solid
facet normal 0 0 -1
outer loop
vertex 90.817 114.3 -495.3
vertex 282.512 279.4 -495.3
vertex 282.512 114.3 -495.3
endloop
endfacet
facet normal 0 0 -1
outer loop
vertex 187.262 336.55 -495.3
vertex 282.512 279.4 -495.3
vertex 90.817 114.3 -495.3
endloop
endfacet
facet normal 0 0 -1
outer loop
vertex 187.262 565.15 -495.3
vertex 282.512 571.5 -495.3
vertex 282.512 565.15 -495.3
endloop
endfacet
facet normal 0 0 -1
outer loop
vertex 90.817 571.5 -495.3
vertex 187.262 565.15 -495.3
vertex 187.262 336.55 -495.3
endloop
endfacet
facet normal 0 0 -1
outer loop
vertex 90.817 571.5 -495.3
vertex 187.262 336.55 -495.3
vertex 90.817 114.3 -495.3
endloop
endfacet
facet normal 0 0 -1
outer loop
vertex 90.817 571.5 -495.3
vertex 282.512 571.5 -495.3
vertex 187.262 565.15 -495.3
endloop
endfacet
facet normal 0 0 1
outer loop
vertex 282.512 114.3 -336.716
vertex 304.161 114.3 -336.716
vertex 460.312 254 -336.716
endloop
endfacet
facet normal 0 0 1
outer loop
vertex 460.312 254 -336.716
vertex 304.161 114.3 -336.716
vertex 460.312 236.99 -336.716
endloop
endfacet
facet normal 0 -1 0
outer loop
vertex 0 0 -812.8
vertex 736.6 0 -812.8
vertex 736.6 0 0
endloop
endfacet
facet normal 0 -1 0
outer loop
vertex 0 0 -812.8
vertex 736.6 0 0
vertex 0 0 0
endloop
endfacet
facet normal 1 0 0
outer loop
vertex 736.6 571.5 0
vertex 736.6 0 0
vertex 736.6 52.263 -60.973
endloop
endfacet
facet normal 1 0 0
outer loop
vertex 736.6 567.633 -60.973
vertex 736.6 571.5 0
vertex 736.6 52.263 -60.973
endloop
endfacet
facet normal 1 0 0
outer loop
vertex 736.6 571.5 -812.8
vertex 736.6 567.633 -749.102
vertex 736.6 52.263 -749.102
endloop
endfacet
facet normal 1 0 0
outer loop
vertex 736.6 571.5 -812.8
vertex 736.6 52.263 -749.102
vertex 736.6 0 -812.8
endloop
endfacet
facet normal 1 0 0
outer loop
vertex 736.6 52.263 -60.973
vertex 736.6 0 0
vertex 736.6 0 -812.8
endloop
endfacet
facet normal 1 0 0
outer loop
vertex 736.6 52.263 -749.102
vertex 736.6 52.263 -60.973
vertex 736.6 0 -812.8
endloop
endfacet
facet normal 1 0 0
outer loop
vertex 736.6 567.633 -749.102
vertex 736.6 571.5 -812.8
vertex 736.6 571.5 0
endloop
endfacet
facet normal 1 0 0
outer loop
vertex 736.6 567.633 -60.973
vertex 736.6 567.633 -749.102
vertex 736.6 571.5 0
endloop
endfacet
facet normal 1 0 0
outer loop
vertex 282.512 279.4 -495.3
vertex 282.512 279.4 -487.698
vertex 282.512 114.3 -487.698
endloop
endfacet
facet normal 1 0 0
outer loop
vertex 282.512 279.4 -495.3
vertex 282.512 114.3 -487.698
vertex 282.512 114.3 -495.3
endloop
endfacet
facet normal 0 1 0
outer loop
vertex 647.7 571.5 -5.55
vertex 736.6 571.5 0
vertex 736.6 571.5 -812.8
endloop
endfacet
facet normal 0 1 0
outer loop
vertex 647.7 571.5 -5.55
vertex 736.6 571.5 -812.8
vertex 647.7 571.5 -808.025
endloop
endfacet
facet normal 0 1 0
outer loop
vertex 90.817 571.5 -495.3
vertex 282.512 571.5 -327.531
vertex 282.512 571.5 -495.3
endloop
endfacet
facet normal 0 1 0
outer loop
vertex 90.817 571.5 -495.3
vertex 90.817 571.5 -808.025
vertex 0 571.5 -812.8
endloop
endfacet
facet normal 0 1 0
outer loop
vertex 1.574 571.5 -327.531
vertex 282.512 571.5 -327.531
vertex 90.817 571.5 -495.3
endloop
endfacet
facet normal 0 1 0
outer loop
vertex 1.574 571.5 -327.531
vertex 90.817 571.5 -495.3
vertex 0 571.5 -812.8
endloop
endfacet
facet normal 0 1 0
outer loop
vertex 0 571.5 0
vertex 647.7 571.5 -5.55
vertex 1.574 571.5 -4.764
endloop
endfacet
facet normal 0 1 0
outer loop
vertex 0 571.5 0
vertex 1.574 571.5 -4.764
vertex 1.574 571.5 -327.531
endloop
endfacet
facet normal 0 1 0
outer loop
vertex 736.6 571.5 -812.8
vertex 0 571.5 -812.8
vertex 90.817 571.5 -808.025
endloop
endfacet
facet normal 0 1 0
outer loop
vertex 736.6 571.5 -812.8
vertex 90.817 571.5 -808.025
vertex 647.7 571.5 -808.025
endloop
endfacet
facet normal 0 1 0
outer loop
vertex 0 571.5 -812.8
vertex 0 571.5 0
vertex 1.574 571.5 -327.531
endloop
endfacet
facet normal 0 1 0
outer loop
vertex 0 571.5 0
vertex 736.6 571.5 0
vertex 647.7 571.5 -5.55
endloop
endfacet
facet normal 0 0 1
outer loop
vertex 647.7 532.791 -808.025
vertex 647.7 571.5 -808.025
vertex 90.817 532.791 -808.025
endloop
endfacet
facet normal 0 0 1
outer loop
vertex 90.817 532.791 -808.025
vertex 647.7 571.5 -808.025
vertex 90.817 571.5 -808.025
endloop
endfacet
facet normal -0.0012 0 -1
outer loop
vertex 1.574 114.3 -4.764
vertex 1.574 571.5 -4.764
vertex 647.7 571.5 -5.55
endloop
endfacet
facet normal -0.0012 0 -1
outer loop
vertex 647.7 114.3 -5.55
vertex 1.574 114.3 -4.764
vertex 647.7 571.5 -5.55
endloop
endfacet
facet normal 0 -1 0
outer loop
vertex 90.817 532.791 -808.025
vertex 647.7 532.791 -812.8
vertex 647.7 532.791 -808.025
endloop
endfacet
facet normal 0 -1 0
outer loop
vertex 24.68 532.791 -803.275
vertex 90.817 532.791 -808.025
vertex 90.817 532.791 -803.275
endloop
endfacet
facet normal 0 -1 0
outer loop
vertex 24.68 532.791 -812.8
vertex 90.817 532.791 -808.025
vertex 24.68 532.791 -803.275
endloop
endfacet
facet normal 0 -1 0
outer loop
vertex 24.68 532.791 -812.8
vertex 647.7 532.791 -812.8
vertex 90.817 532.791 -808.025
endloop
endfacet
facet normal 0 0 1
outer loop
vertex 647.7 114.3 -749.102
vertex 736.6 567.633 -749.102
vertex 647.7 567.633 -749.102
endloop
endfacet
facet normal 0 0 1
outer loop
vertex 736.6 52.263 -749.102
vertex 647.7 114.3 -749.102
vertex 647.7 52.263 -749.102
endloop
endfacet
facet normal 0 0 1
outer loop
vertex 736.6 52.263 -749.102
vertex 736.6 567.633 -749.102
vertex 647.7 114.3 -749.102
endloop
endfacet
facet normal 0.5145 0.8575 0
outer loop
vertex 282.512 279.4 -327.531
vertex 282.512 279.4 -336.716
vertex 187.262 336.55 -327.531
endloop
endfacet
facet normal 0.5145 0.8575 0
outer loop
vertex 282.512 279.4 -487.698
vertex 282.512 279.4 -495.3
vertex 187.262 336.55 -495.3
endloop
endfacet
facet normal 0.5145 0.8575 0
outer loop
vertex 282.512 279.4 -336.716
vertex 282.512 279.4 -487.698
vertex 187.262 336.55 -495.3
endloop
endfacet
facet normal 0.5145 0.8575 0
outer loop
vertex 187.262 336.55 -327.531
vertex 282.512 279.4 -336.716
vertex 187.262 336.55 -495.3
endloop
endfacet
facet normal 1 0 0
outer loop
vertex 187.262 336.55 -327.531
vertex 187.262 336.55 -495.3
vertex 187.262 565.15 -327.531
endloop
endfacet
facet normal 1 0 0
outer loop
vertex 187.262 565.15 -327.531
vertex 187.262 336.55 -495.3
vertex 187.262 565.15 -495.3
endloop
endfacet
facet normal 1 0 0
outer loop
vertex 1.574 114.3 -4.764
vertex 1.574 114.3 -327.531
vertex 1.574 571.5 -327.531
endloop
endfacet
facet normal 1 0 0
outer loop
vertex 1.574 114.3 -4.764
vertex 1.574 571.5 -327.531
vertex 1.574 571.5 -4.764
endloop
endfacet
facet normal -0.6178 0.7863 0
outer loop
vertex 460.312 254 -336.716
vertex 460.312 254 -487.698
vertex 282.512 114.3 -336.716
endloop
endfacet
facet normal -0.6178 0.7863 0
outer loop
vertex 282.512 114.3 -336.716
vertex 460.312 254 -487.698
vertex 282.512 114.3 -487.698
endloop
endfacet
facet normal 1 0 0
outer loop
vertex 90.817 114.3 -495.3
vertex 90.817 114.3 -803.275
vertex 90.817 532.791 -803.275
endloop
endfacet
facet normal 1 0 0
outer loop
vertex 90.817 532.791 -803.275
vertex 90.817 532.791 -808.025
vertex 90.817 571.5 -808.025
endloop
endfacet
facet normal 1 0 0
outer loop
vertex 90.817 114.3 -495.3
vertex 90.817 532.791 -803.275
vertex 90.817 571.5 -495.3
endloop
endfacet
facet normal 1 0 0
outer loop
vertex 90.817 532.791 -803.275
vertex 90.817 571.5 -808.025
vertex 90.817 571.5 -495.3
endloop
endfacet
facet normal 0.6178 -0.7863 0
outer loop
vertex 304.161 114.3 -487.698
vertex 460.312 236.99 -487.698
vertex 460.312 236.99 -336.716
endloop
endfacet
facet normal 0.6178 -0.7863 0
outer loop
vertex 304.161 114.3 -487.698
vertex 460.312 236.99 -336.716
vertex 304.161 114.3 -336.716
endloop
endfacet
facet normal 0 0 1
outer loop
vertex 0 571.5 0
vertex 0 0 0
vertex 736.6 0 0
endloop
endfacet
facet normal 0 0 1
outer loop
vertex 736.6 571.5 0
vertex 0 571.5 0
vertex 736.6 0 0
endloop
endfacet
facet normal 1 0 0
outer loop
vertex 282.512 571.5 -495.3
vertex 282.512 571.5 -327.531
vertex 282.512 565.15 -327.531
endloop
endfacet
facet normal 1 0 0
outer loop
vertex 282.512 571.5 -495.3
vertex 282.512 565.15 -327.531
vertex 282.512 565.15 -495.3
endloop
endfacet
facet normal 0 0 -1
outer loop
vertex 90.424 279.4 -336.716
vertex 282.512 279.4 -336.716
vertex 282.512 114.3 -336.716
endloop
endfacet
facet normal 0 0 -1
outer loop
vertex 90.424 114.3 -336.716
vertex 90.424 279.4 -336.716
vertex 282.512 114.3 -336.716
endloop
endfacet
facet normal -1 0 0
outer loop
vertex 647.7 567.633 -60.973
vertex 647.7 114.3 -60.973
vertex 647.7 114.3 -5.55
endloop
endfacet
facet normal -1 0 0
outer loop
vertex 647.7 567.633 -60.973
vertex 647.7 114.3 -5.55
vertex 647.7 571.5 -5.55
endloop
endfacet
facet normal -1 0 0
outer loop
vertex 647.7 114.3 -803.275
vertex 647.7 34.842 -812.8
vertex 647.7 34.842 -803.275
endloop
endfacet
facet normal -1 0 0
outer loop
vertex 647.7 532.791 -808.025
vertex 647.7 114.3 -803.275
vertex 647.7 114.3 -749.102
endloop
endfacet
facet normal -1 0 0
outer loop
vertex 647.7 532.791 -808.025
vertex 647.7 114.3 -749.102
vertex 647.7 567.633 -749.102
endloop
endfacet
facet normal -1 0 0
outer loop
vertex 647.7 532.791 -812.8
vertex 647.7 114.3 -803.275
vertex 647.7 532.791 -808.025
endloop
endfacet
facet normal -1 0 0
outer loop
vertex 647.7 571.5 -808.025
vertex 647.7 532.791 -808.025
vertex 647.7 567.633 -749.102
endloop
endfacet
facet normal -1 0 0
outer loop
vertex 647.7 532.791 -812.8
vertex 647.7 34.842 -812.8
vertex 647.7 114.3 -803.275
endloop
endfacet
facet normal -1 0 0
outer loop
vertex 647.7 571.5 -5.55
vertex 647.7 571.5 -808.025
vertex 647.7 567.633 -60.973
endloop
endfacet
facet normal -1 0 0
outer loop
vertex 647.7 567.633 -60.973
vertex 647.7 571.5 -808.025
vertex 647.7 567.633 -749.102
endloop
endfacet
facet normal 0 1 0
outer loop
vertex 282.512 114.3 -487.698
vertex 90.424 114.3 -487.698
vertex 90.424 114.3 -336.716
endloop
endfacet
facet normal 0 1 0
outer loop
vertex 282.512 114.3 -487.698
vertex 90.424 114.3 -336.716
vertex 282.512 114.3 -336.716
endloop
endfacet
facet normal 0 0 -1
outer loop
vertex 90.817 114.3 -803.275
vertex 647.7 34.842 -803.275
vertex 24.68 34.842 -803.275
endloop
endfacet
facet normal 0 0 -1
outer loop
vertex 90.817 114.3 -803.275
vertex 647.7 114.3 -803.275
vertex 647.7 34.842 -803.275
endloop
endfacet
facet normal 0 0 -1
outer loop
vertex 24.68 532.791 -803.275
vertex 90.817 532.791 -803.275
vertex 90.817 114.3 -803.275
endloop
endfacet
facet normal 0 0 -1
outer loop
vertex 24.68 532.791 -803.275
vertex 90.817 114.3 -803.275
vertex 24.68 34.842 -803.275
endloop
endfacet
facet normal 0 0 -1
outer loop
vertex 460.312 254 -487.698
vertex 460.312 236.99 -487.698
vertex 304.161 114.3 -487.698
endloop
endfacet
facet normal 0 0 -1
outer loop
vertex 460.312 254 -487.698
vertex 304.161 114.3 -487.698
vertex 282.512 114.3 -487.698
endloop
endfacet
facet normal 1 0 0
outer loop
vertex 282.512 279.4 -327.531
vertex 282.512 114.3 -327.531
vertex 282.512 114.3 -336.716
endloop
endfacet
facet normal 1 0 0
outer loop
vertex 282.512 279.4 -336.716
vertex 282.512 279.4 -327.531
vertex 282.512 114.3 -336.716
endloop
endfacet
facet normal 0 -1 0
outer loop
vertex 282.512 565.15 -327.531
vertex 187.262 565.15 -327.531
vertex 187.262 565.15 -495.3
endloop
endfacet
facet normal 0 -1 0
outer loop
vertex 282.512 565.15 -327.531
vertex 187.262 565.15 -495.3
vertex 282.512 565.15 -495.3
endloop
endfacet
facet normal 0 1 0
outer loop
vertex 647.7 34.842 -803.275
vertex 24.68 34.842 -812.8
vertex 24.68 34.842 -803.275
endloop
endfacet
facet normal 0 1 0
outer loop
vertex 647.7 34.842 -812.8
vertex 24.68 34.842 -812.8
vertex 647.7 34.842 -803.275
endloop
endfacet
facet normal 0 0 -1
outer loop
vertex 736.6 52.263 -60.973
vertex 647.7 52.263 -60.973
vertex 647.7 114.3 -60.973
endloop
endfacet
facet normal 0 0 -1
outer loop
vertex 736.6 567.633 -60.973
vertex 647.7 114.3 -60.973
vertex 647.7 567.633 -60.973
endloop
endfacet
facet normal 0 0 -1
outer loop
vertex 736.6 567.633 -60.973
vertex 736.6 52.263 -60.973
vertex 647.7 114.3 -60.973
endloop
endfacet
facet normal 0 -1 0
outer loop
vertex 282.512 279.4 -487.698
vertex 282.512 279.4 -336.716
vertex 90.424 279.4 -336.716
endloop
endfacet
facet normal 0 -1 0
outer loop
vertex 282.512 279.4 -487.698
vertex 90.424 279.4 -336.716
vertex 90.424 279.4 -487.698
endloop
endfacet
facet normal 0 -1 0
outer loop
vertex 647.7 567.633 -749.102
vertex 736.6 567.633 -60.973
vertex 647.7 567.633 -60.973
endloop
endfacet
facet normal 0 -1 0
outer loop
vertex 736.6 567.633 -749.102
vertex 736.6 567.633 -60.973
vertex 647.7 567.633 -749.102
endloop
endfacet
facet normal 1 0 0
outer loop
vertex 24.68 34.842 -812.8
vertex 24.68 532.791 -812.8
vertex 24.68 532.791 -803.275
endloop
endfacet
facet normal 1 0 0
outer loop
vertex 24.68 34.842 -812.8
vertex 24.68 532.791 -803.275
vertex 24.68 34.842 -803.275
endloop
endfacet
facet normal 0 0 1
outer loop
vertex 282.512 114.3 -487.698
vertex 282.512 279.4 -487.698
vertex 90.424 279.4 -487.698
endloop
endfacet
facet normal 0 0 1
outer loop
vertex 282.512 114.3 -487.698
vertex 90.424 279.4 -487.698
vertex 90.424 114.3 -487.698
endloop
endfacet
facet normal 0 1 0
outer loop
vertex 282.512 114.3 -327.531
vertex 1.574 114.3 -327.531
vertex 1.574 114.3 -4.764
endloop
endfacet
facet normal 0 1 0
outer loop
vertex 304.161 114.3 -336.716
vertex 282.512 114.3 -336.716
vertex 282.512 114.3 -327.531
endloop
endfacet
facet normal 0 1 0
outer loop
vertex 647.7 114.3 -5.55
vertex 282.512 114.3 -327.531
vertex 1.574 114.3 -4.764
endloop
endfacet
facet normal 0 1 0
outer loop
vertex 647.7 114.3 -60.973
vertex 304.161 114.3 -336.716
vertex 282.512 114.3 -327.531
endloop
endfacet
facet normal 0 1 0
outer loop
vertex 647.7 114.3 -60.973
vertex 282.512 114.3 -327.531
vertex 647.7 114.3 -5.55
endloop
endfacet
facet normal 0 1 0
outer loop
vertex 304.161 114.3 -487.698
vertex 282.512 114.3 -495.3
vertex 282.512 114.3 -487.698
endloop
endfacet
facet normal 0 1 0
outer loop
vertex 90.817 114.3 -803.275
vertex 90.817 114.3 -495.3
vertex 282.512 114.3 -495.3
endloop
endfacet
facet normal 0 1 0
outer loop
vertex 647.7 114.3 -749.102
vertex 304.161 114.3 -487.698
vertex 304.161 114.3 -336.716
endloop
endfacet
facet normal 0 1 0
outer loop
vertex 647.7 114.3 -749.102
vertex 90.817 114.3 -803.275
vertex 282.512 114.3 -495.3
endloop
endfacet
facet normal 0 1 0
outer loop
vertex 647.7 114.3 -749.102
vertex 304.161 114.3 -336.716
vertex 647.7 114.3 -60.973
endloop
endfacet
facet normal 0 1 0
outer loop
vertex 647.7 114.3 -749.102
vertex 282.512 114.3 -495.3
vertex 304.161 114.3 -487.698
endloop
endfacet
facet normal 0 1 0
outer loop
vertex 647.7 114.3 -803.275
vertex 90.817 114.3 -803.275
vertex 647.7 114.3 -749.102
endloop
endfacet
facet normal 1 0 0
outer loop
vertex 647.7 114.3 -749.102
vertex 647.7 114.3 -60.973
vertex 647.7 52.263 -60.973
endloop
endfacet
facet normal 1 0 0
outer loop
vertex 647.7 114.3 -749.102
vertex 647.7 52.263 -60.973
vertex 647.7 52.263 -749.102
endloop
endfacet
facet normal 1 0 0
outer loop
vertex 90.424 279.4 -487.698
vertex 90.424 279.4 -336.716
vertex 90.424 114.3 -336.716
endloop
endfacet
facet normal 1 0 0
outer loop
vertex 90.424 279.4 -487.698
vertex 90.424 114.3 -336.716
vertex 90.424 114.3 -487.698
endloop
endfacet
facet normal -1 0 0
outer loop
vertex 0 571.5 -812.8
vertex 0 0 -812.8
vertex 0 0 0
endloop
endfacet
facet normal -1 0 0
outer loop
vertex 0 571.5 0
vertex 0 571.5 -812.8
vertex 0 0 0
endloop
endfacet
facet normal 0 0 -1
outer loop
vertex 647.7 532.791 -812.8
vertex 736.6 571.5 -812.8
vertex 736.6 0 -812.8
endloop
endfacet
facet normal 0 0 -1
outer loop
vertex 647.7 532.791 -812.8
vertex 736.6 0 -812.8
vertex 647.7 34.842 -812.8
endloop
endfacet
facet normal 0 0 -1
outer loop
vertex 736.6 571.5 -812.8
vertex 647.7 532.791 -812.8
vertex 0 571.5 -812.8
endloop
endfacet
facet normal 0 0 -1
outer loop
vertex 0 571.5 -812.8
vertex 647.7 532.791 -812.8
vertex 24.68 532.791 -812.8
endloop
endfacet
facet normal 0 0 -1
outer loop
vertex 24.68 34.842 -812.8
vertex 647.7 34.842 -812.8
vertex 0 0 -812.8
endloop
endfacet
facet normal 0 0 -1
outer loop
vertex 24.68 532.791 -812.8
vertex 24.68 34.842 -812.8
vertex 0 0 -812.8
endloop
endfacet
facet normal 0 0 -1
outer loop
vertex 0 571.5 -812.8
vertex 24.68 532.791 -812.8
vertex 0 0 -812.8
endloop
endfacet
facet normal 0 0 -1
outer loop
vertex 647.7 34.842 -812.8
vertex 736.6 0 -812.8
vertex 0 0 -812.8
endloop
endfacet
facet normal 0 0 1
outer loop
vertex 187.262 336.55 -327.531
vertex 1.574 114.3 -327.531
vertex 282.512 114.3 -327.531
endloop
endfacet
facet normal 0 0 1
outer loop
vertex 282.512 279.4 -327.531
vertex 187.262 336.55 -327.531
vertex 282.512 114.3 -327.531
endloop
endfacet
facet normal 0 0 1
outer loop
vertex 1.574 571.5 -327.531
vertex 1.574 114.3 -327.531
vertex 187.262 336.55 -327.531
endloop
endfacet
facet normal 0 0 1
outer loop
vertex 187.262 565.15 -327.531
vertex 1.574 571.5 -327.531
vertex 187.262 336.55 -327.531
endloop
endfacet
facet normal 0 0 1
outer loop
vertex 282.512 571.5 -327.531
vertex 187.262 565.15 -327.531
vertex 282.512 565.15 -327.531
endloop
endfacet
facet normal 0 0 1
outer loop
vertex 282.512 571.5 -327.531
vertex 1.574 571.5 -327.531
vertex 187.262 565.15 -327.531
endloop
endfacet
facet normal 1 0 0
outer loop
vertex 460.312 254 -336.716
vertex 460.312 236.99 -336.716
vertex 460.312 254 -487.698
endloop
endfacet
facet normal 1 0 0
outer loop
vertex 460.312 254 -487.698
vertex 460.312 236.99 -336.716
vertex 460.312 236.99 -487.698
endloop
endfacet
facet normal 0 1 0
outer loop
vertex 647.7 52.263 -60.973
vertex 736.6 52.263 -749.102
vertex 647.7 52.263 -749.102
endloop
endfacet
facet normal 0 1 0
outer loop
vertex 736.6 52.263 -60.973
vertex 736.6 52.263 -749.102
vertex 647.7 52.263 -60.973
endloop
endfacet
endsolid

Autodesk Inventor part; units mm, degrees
ref_plane "YZ Plane" through (0, 0, 0) normal (1, 0, 0) x (0, 1, 0)
ref_plane "XZ Plane" through (0, 0, 0) normal (0, 1, 0) x (-1, 0, 0)
ref_plane "XY Plane" through (0, 0, 0) normal (0, 0, 1) x (1, 0, 0)
sketch "Sketch1" plane through (0, 0, 0) normal (0, 1, 0) x (-1, 0, 0)
  line L0 (0, 0) -> (-736.6, 0)
  line L1 (-736.6, 0) -> (-736.6, -812.8)
  line L2 (-736.6, -812.8) -> (0, -812.8)
  line L3 (0, -812.8) -> (0, 0)
  dimension "d0" = 736.6
  dimension "d1" = 812.8
extrude "Extrusion1" add sketch "Sketch1" along normal blind 571.5
sketch "Sketch2" plane through (0, 571.5, 0) normal (0, 1, 0) x (1, 0, 0)
  line L0 (0, 812.8) -> (0, 0) projected
  line L1 (0, 812.8) -> (88.9, 812.8)
  line L2 (88.9, 812.8) -> (88.9, 574.8444)
  line L3 (88.9, 574.8444) -> (0, 574.8444)
  line L4 (0, 574.8444) -> (0, 812.8)
  dimension "d4" = 88.9
sketch "Sketch7" plane through (0, 571.5, 0) normal (0, 1, 0) x (1, 0, 0)
  line L0 (647.7, 808.0248) -> (90.8173, 808.0248)
  line L1 (90.8173, 808.0248) -> (90.8173, 495.3)
  line L2 (0, 327.5313) -> (279.4, 327.5313)
  line L3 (282.5115, 327.5313) -> (282.5115, 495.3)
  line L4 (279.4, 327.5313) -> (282.5115, 327.5313)
  line L5 (282.5115, 327.5313) -> (0, 327.5313)
  line L6 (647.7, 808.0248) -> (90.8173, 808.0248)
  line L7 (282.5115, 495.3) -> (90.8173, 495.3)
  line L8 (1.5741, 327.5313) -> (1.5741, 4.7643)
  line L9 (1.5741, 4.7643) -> (647.7, 5.5504)
  line L10 (647.7, 808.0248) -> (647.7, 5.5504)
  line L11 (0, 0) -> (736.6, 0) projected
  point P0 (736.6, 812.8)
extrude "Extrusion7" cut sketch "Sketch7" against normal blind 457.2
sketch "Sketch8" plane through (736.6, 0, 0) normal (1, 0, 0) x (0, 0, -1)
  line L0 (60.9734, 567.6333) -> (749.1017, 567.6333)
  line L1 (749.1017, 567.6333) -> (749.1017, 52.2629)
  line L2 (749.1017, 52.2629) -> (60.9734, 52.2629)
  line L3 (60.9734, 52.2629) -> (60.9734, 567.6333)
  point P0 (0, 0)
extrude "Extrusion8" cut sketch "Sketch8" against normal blind 88.9
sketch "Sketch9" plane through (282.5115, 571.5, -327.5313) normal (1, 0, 0) x (0, 0, -1)
  line L0 (0, 0) -> (0, -457.2) projected
  line L1 (0, -292.1) -> (167.7687, -292.1)
  line L2 (167.7687, 0) -> (167.7687, -457.2) projected
  line L3 (421.5704, -457.2) -> (-266.5579, -457.2) projected
  line L4 (9.1846, -292.1) -> (9.1846, -457.2)
  line L5 (160.1669, -292.1) -> (160.1669, -457.2)
  point P0 (-327.5313, -571.5)
  dimension "d29" = 165.1
extrude "Extrusion9" cut sketch "Sketch9" against normal blind 192.0875 contours L1 L5 L3 L4
sketch "Sketch10" plane through (736.6, 0, -812.8) normal (0, 0, -1) x (-1, 0, 0)
  line L0 (88.9, 571.5) -> (88.9, 114.3) projected
  line L1 (88.9, 532.7914) -> (711.9203, 532.7914)
  line L2 (711.9203, 532.7914) -> (711.9203, 34.8419)
  line L3 (711.9203, 34.8419) -> (88.9, 34.8419)
  line L4 (88.9, 34.8419) -> (88.9, 532.7914)
  point P0 (736.6, 0)
extrude "Extrusion10" cut sketch "Sketch10" against normal blind 9.525
sketch "Sketch11" plane through (282.5115, 571.5, -495.3) normal (0, 0, -1) x (-1, 0, 0)
  line L0 (0, 0) -> (0, -457.2) projected
  line L1 (0, -292.1) -> (191.6942, -292.1)
  line L2 (191.6942, 0) -> (191.6942, -457.2) projected
  line L3 (0, -457.2) -> (191.6942, -457.2) projected
  line L4 (95.25, -292.1) -> (95.25, -234.95)
  line L5 (0, -292.1) -> (95.25, -234.95)
  line L6 (95.25, -234.95) -> (95.25, -6.35)
  line L7 (95.25, -6.35) -> (0, -6.35)
  point P0 (282.5115, -571.5)
  dimension "d34" = 165.1
  dimension "d35" = 57.15
  dimension "d36" = 95.25
  dimension "d37" = 228.6
extrude "Extrusion11" cut sketch "Sketch11" against normal blind 192.0875 contours L7 L6 L5 L0
sketch "Sketch12" plane through (0, 114.3, 0) normal (0, 1, 0) x (1, 0, 0)
  line L0 (282.5115, 336.7158) -> (460.3115, 336.7158)
  line L1 (460.3115, 336.7158) -> (460.3115, 487.6982)
  line L2 (460.3115, 487.6982) -> (282.5115, 487.6982)
  line L3 (282.5115, 487.6982) -> (282.5115, 336.7158)
  point P0 (0, 0)
  dimension "d40" = 177.8
extrude "Extrusion12" add sketch "Sketch12" along normal blind 139.7
sketch "Sketch13" plane through (460.3115, 114.3, -487.6982) normal (0, 0, -1) x (-1, 0, 0)
  line L0 (0, 0) -> (0, 139.7) projected
  line L1 (177.8, 165.1) -> (177.8, 0) projected
  line L2 (0, 139.7) -> (177.8, 0)
  line L3 (0, 122.6899) -> (156.1508, 0)
  line L4 (-187.3885, 0) -> (369.4942, 0) projected
  point P0 (460.3115, -114.3)
extrude "Extrusion13" cut sketch "Sketch13" against normal blind 188.9125 contours L0 L3 L4
sketch "Sketch14" plane through (460.3115, 254, -487.6982) normal (0, 0, -1) x (-1, 0, 0)
  line L0 (177.8, 0) -> (177.8, -139.7) projected
  line L1 (0, 0) -> (177.8, -139.7)
  line L2 (458.7374, -139.7) -> (177.8, -139.7) projected
  line L3 (177.8, -139.7) -> (177.8, 0) projected
  line L4 (177.8, -139.7) -> (177.8, 0)
  line L5 (0, 0) -> (177.8, 0) projected
  line L6 (177.8, 0) -> (0, 0)
  point P0 (460.3115, -254)
extrude "Extrusion14" cut sketch "Sketch14" against normal blind 185.7375
properties part number "bot test 1"
